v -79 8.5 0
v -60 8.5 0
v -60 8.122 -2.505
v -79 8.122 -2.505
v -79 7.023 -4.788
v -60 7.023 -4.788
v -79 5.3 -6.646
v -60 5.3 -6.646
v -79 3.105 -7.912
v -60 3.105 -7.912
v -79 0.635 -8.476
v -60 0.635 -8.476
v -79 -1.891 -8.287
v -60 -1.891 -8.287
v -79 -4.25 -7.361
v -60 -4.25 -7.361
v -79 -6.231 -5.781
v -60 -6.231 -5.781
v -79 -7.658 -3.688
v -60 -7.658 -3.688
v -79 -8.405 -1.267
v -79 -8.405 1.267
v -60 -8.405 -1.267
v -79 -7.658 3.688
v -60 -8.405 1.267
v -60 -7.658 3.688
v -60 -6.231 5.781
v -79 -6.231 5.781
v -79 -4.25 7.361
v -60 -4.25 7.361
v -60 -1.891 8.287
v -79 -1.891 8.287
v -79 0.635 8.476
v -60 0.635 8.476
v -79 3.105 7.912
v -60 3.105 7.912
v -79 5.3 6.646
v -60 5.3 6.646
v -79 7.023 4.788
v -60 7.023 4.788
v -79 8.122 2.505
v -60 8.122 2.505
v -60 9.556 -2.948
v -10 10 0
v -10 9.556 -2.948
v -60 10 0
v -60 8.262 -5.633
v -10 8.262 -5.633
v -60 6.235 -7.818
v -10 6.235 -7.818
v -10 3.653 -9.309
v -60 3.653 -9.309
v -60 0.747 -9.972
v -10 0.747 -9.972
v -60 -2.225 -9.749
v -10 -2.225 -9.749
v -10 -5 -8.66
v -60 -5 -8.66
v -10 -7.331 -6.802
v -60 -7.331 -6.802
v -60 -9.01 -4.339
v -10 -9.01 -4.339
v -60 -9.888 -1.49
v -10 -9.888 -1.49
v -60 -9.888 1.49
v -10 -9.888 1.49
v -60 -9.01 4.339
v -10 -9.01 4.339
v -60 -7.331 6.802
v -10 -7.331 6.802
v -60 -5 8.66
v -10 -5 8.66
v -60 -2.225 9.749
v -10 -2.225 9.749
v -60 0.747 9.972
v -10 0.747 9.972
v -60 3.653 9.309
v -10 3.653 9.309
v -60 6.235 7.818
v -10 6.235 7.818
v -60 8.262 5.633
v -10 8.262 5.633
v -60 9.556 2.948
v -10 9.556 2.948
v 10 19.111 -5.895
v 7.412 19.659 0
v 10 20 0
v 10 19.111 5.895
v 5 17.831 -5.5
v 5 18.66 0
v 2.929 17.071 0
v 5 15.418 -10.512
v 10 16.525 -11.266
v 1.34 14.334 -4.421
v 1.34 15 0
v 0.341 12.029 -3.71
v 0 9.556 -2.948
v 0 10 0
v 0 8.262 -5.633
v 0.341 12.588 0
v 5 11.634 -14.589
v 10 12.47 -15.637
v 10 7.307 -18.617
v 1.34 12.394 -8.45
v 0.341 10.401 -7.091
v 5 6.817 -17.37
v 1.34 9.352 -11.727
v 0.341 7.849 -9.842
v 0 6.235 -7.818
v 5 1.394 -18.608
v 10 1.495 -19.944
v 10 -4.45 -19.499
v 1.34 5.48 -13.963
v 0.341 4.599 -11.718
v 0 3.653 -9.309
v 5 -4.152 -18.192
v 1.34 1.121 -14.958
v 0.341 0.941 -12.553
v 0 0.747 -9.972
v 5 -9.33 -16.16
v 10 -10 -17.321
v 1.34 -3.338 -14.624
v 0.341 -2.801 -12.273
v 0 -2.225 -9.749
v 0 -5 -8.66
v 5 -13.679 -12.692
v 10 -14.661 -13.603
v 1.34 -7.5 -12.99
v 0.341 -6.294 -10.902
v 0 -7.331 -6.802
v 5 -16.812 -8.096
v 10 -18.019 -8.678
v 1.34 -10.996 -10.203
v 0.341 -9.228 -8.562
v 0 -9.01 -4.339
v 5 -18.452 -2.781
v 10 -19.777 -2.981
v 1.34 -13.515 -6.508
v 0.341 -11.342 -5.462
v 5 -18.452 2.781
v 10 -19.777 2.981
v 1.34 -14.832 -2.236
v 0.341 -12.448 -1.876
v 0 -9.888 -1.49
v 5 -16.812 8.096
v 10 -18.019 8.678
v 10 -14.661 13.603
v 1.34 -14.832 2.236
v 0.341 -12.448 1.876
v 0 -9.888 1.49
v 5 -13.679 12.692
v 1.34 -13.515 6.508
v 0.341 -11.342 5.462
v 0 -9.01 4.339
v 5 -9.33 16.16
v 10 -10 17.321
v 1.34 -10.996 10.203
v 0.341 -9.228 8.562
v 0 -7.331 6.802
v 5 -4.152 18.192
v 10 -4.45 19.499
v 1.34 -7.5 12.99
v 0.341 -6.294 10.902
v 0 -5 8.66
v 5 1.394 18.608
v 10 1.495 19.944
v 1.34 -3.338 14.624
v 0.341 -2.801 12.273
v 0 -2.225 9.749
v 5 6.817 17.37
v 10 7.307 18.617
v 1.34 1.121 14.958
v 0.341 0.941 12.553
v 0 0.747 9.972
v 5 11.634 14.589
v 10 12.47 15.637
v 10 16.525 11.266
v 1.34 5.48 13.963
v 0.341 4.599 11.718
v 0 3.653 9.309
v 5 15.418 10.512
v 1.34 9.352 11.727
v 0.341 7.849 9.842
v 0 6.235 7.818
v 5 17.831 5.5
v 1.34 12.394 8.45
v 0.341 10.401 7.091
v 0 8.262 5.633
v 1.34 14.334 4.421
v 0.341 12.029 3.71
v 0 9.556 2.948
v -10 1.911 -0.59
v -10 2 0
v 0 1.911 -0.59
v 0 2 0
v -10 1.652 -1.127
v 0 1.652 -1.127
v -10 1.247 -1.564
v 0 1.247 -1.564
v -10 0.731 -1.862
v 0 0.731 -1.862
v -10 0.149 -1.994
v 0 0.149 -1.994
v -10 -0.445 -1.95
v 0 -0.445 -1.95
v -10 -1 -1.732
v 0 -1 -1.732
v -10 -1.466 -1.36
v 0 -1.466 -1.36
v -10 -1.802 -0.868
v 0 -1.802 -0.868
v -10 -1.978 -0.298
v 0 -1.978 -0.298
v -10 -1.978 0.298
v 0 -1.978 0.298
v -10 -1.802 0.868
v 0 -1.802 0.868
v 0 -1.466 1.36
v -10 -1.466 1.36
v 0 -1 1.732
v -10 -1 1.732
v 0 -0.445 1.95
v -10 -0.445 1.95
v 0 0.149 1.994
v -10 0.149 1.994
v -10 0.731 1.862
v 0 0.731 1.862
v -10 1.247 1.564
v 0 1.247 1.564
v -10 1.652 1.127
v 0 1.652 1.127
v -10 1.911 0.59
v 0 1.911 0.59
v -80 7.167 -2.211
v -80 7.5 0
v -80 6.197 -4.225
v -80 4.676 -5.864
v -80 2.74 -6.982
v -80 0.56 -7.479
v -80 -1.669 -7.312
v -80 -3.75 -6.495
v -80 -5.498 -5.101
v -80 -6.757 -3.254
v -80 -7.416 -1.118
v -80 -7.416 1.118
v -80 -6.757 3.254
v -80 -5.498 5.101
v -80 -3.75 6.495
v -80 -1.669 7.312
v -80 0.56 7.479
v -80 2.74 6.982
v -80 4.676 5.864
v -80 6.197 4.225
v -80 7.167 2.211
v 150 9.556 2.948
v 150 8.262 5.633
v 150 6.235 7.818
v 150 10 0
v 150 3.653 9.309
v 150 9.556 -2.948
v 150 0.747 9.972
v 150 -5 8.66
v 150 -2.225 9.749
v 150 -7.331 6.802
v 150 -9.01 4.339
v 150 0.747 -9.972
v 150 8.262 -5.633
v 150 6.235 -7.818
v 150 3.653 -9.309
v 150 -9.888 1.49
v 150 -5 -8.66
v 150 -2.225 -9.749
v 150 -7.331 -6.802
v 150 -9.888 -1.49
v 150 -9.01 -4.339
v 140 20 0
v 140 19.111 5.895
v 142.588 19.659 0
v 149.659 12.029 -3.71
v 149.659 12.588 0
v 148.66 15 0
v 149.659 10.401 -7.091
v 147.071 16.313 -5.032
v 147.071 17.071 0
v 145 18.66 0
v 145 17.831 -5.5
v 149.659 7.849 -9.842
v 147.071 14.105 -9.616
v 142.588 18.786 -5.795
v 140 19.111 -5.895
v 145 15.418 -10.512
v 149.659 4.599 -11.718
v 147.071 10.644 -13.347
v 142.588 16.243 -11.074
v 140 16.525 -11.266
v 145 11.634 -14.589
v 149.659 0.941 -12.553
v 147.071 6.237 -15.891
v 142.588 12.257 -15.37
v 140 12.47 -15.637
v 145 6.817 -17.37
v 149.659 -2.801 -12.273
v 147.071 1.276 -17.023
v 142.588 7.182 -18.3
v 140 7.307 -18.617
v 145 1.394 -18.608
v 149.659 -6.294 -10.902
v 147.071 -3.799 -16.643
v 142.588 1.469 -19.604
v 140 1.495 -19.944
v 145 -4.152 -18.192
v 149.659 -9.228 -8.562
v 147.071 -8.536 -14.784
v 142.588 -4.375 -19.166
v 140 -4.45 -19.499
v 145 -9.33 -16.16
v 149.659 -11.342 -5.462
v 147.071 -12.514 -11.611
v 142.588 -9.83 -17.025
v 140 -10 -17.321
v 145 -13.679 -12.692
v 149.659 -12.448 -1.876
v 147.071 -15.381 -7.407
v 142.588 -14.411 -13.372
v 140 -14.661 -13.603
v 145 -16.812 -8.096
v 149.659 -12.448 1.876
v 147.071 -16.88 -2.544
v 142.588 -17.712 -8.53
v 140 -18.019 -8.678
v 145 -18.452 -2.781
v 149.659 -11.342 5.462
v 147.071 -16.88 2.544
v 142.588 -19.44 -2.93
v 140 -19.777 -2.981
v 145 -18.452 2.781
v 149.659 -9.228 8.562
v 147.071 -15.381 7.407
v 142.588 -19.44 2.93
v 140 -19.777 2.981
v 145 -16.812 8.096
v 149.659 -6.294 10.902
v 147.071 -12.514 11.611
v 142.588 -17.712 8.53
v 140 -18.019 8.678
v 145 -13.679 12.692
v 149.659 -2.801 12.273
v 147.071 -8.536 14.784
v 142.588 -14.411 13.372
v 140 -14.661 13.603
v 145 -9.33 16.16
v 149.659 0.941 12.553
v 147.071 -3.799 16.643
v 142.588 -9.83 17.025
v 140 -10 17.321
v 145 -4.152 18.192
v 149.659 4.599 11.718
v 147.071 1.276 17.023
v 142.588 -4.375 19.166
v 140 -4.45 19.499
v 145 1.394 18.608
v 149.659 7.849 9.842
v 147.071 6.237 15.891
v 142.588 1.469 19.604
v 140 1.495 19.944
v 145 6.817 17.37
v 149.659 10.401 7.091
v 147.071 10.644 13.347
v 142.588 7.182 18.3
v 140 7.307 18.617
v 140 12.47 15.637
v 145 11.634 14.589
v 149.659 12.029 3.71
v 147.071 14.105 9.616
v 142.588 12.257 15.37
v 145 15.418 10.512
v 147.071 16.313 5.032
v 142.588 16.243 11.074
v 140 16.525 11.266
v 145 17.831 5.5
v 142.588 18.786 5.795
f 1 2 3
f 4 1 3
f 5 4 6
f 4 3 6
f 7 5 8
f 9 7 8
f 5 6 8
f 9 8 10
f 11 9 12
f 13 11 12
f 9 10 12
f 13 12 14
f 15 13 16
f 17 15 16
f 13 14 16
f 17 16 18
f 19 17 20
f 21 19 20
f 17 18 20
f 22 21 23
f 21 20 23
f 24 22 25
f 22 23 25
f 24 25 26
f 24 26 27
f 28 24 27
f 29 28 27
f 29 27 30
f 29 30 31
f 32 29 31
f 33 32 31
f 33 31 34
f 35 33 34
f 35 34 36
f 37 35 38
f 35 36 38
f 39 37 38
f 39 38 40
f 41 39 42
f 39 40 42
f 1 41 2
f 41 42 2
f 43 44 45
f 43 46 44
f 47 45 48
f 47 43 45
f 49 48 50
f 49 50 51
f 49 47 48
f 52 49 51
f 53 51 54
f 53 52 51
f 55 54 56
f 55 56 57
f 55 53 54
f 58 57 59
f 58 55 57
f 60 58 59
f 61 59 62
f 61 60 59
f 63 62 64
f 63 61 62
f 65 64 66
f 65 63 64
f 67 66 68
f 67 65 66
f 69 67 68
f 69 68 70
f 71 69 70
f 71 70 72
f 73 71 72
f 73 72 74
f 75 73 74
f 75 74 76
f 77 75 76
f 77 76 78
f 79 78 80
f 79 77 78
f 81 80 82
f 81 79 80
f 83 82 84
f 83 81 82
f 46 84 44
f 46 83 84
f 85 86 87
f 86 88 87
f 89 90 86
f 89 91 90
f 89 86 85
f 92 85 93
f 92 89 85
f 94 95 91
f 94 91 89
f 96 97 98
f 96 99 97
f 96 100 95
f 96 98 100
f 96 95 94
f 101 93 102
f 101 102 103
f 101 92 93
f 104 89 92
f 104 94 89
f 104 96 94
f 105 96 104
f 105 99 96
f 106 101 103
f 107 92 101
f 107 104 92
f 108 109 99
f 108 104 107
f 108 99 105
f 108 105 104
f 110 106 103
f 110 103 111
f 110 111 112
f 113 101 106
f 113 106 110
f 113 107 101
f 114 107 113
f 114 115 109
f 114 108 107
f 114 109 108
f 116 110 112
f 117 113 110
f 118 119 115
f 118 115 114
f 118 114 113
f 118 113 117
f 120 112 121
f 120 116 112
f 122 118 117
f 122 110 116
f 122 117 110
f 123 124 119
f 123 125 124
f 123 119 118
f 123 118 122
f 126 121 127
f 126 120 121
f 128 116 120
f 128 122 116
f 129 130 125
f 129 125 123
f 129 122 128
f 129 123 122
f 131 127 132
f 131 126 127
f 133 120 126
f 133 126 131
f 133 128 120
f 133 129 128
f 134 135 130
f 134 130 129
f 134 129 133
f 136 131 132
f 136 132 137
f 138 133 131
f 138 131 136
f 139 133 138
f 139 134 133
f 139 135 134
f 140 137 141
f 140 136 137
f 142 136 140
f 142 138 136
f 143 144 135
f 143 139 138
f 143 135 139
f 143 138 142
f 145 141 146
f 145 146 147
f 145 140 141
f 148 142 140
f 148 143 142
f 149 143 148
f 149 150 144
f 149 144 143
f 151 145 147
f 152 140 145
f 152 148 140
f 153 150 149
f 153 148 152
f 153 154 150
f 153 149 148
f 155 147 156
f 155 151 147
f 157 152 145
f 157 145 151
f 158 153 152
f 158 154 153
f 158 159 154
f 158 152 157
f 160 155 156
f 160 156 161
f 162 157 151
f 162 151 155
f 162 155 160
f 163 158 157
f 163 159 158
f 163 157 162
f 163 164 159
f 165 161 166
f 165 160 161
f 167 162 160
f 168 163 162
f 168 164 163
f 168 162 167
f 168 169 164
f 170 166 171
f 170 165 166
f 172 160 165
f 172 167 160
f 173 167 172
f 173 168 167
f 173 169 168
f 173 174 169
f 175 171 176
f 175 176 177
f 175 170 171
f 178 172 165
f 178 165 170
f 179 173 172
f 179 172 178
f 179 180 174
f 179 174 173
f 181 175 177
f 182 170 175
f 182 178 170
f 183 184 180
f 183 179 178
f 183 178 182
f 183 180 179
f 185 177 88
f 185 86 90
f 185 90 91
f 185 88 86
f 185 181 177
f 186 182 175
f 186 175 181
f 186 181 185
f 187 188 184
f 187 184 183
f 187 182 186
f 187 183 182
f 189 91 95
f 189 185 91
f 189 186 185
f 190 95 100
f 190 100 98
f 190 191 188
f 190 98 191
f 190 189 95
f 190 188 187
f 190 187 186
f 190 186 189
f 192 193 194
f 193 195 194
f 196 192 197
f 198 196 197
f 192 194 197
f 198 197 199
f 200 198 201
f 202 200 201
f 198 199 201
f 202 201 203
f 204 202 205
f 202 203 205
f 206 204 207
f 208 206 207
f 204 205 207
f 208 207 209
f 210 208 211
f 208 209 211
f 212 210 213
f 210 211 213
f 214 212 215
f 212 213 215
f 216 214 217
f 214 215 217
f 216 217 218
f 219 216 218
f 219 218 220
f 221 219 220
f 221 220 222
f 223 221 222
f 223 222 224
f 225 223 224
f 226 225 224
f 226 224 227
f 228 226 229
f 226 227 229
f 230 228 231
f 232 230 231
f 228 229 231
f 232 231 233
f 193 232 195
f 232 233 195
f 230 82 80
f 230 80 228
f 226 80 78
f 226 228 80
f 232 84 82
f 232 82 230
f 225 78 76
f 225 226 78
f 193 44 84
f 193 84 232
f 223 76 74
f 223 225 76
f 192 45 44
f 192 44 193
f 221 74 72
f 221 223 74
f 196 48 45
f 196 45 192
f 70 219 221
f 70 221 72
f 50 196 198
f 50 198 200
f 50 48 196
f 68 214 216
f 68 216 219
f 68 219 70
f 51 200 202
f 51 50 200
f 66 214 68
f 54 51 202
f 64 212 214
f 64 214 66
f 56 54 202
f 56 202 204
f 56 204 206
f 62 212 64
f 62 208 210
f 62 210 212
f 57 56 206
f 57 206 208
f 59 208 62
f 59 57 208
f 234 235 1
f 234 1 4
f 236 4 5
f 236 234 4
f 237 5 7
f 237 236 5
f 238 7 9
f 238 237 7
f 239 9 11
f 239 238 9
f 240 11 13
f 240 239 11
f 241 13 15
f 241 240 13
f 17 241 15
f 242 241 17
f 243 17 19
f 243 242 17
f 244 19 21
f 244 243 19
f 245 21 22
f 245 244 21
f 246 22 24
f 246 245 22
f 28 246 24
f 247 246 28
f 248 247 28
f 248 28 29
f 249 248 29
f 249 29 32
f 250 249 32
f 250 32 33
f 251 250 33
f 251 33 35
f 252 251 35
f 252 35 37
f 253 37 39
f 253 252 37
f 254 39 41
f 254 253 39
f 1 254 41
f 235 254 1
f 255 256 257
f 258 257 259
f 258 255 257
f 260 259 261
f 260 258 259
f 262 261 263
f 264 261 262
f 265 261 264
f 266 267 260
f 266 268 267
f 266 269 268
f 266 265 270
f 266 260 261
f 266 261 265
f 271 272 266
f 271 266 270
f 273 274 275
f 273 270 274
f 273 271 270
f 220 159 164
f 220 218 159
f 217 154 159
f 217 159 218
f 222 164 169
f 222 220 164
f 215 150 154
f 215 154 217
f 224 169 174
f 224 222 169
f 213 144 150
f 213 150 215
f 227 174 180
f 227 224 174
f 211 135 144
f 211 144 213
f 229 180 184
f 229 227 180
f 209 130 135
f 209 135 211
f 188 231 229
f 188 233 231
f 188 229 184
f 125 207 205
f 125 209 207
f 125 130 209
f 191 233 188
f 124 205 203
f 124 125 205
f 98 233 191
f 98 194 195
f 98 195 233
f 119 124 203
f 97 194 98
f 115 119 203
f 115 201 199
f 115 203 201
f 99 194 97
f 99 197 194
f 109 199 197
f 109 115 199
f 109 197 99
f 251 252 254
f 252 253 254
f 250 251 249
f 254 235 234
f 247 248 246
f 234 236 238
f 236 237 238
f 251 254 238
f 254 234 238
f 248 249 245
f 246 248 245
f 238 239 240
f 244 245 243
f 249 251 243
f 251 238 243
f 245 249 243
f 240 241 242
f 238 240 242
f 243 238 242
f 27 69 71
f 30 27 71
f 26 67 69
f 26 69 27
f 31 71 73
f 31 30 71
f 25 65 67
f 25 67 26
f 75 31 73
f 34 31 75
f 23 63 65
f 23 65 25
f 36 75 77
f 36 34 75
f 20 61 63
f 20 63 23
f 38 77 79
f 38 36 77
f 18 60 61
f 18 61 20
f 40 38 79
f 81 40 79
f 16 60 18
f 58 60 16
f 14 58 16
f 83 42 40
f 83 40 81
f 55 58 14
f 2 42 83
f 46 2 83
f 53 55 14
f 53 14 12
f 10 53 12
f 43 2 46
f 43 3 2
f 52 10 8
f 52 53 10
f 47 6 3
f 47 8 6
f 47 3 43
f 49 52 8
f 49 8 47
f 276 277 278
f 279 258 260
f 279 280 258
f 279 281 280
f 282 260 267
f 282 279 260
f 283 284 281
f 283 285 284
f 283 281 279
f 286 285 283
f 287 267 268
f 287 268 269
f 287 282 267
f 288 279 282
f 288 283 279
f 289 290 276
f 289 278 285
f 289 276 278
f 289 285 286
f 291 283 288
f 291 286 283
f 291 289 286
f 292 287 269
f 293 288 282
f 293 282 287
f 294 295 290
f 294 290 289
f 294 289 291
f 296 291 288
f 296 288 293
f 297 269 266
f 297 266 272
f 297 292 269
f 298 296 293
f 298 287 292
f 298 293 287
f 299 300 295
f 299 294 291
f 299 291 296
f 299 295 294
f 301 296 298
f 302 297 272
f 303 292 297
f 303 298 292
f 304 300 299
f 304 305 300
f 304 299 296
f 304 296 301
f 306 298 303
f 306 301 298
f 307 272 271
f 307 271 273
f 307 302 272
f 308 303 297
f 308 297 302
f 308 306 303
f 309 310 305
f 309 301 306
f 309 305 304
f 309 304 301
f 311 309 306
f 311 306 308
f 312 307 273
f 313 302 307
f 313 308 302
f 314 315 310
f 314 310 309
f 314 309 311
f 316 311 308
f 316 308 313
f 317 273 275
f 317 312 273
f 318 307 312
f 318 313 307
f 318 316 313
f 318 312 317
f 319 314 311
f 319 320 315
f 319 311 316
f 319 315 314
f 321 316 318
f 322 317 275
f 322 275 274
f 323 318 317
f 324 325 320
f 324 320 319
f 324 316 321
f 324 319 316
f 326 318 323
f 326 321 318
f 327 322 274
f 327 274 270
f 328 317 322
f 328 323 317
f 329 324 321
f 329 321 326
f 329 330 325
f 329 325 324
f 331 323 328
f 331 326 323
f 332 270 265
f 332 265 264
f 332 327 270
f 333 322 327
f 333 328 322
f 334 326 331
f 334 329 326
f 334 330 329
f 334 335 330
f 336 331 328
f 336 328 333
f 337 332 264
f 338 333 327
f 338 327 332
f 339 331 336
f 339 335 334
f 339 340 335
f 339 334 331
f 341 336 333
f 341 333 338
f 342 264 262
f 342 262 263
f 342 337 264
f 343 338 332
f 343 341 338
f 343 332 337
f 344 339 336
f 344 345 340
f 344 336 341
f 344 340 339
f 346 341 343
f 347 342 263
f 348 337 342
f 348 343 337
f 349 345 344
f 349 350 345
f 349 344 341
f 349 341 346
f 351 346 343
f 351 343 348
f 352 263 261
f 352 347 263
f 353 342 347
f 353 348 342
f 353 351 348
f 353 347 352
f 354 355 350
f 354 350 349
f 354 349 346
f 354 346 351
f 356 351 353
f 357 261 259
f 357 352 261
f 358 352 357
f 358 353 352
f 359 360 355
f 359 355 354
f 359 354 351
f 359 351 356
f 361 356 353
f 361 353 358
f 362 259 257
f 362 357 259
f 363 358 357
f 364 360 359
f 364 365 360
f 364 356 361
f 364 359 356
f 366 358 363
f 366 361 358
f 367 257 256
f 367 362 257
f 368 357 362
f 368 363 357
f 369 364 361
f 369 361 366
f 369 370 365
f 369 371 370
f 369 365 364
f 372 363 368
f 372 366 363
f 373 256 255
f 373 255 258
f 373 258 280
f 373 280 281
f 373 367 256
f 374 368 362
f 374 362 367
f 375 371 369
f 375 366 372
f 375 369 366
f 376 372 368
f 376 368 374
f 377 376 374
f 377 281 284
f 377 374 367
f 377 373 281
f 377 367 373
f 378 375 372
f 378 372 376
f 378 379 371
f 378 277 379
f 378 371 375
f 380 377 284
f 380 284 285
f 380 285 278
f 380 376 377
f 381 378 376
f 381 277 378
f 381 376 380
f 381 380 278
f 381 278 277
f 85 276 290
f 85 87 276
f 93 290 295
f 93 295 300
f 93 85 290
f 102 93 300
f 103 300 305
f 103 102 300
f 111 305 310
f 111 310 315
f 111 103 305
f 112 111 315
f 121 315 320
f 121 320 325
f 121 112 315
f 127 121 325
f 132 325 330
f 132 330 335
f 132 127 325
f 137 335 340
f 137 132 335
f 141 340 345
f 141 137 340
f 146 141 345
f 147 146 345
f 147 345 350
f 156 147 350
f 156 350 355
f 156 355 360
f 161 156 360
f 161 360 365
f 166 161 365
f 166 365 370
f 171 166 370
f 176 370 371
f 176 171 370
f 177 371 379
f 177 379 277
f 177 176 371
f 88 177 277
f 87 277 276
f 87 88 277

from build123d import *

# Parameters (mm, degrees)
F0_W    = 10
F0_H    = 2
F0_W_2  = 20
F0_H_2  = 8.5
F2_SIZE = 1


with BuildPart() as f1:
    # F0 (on Top) → F1 (revolve)
    with BuildSketch(Plane.XY):
        with BuildLine():
            Line((0, 2), (0, 0))
            Line((0, 0), (150, 0))
            Line((150, 0), (150, 10))
            ThreePointArc((150, 10), (147.071068, 17.071068), (140, 20))
            Line((140, 20), (10, 20))
            ThreePointArc((10, 20), (2.928932, 17.071068), (0, 10))
            Line((0, 10), (0, 2))
        make_face()
        with Locations((-5, 1)):
            Rectangle(F0_W, F0_H)
        Polygon((-60, 0), (-10, 0), (-10, 2), (-10, 10), (-60, 10), (-60, 8.5), align=None)
        with Locations((-70, 4.25)):
            Rectangle(F0_W_2, F0_H_2)
    revolve(axis=Axis((-35, 0, 0), (-1, 0, 0)))

    # F2
    f2_edges = [f1.edges().sort_by_distance(p)[0] for p in [
        (-80, -8.5, 0),
    ]]
    chamfer(f2_edges, length=F2_SIZE)


solid = f1.part
